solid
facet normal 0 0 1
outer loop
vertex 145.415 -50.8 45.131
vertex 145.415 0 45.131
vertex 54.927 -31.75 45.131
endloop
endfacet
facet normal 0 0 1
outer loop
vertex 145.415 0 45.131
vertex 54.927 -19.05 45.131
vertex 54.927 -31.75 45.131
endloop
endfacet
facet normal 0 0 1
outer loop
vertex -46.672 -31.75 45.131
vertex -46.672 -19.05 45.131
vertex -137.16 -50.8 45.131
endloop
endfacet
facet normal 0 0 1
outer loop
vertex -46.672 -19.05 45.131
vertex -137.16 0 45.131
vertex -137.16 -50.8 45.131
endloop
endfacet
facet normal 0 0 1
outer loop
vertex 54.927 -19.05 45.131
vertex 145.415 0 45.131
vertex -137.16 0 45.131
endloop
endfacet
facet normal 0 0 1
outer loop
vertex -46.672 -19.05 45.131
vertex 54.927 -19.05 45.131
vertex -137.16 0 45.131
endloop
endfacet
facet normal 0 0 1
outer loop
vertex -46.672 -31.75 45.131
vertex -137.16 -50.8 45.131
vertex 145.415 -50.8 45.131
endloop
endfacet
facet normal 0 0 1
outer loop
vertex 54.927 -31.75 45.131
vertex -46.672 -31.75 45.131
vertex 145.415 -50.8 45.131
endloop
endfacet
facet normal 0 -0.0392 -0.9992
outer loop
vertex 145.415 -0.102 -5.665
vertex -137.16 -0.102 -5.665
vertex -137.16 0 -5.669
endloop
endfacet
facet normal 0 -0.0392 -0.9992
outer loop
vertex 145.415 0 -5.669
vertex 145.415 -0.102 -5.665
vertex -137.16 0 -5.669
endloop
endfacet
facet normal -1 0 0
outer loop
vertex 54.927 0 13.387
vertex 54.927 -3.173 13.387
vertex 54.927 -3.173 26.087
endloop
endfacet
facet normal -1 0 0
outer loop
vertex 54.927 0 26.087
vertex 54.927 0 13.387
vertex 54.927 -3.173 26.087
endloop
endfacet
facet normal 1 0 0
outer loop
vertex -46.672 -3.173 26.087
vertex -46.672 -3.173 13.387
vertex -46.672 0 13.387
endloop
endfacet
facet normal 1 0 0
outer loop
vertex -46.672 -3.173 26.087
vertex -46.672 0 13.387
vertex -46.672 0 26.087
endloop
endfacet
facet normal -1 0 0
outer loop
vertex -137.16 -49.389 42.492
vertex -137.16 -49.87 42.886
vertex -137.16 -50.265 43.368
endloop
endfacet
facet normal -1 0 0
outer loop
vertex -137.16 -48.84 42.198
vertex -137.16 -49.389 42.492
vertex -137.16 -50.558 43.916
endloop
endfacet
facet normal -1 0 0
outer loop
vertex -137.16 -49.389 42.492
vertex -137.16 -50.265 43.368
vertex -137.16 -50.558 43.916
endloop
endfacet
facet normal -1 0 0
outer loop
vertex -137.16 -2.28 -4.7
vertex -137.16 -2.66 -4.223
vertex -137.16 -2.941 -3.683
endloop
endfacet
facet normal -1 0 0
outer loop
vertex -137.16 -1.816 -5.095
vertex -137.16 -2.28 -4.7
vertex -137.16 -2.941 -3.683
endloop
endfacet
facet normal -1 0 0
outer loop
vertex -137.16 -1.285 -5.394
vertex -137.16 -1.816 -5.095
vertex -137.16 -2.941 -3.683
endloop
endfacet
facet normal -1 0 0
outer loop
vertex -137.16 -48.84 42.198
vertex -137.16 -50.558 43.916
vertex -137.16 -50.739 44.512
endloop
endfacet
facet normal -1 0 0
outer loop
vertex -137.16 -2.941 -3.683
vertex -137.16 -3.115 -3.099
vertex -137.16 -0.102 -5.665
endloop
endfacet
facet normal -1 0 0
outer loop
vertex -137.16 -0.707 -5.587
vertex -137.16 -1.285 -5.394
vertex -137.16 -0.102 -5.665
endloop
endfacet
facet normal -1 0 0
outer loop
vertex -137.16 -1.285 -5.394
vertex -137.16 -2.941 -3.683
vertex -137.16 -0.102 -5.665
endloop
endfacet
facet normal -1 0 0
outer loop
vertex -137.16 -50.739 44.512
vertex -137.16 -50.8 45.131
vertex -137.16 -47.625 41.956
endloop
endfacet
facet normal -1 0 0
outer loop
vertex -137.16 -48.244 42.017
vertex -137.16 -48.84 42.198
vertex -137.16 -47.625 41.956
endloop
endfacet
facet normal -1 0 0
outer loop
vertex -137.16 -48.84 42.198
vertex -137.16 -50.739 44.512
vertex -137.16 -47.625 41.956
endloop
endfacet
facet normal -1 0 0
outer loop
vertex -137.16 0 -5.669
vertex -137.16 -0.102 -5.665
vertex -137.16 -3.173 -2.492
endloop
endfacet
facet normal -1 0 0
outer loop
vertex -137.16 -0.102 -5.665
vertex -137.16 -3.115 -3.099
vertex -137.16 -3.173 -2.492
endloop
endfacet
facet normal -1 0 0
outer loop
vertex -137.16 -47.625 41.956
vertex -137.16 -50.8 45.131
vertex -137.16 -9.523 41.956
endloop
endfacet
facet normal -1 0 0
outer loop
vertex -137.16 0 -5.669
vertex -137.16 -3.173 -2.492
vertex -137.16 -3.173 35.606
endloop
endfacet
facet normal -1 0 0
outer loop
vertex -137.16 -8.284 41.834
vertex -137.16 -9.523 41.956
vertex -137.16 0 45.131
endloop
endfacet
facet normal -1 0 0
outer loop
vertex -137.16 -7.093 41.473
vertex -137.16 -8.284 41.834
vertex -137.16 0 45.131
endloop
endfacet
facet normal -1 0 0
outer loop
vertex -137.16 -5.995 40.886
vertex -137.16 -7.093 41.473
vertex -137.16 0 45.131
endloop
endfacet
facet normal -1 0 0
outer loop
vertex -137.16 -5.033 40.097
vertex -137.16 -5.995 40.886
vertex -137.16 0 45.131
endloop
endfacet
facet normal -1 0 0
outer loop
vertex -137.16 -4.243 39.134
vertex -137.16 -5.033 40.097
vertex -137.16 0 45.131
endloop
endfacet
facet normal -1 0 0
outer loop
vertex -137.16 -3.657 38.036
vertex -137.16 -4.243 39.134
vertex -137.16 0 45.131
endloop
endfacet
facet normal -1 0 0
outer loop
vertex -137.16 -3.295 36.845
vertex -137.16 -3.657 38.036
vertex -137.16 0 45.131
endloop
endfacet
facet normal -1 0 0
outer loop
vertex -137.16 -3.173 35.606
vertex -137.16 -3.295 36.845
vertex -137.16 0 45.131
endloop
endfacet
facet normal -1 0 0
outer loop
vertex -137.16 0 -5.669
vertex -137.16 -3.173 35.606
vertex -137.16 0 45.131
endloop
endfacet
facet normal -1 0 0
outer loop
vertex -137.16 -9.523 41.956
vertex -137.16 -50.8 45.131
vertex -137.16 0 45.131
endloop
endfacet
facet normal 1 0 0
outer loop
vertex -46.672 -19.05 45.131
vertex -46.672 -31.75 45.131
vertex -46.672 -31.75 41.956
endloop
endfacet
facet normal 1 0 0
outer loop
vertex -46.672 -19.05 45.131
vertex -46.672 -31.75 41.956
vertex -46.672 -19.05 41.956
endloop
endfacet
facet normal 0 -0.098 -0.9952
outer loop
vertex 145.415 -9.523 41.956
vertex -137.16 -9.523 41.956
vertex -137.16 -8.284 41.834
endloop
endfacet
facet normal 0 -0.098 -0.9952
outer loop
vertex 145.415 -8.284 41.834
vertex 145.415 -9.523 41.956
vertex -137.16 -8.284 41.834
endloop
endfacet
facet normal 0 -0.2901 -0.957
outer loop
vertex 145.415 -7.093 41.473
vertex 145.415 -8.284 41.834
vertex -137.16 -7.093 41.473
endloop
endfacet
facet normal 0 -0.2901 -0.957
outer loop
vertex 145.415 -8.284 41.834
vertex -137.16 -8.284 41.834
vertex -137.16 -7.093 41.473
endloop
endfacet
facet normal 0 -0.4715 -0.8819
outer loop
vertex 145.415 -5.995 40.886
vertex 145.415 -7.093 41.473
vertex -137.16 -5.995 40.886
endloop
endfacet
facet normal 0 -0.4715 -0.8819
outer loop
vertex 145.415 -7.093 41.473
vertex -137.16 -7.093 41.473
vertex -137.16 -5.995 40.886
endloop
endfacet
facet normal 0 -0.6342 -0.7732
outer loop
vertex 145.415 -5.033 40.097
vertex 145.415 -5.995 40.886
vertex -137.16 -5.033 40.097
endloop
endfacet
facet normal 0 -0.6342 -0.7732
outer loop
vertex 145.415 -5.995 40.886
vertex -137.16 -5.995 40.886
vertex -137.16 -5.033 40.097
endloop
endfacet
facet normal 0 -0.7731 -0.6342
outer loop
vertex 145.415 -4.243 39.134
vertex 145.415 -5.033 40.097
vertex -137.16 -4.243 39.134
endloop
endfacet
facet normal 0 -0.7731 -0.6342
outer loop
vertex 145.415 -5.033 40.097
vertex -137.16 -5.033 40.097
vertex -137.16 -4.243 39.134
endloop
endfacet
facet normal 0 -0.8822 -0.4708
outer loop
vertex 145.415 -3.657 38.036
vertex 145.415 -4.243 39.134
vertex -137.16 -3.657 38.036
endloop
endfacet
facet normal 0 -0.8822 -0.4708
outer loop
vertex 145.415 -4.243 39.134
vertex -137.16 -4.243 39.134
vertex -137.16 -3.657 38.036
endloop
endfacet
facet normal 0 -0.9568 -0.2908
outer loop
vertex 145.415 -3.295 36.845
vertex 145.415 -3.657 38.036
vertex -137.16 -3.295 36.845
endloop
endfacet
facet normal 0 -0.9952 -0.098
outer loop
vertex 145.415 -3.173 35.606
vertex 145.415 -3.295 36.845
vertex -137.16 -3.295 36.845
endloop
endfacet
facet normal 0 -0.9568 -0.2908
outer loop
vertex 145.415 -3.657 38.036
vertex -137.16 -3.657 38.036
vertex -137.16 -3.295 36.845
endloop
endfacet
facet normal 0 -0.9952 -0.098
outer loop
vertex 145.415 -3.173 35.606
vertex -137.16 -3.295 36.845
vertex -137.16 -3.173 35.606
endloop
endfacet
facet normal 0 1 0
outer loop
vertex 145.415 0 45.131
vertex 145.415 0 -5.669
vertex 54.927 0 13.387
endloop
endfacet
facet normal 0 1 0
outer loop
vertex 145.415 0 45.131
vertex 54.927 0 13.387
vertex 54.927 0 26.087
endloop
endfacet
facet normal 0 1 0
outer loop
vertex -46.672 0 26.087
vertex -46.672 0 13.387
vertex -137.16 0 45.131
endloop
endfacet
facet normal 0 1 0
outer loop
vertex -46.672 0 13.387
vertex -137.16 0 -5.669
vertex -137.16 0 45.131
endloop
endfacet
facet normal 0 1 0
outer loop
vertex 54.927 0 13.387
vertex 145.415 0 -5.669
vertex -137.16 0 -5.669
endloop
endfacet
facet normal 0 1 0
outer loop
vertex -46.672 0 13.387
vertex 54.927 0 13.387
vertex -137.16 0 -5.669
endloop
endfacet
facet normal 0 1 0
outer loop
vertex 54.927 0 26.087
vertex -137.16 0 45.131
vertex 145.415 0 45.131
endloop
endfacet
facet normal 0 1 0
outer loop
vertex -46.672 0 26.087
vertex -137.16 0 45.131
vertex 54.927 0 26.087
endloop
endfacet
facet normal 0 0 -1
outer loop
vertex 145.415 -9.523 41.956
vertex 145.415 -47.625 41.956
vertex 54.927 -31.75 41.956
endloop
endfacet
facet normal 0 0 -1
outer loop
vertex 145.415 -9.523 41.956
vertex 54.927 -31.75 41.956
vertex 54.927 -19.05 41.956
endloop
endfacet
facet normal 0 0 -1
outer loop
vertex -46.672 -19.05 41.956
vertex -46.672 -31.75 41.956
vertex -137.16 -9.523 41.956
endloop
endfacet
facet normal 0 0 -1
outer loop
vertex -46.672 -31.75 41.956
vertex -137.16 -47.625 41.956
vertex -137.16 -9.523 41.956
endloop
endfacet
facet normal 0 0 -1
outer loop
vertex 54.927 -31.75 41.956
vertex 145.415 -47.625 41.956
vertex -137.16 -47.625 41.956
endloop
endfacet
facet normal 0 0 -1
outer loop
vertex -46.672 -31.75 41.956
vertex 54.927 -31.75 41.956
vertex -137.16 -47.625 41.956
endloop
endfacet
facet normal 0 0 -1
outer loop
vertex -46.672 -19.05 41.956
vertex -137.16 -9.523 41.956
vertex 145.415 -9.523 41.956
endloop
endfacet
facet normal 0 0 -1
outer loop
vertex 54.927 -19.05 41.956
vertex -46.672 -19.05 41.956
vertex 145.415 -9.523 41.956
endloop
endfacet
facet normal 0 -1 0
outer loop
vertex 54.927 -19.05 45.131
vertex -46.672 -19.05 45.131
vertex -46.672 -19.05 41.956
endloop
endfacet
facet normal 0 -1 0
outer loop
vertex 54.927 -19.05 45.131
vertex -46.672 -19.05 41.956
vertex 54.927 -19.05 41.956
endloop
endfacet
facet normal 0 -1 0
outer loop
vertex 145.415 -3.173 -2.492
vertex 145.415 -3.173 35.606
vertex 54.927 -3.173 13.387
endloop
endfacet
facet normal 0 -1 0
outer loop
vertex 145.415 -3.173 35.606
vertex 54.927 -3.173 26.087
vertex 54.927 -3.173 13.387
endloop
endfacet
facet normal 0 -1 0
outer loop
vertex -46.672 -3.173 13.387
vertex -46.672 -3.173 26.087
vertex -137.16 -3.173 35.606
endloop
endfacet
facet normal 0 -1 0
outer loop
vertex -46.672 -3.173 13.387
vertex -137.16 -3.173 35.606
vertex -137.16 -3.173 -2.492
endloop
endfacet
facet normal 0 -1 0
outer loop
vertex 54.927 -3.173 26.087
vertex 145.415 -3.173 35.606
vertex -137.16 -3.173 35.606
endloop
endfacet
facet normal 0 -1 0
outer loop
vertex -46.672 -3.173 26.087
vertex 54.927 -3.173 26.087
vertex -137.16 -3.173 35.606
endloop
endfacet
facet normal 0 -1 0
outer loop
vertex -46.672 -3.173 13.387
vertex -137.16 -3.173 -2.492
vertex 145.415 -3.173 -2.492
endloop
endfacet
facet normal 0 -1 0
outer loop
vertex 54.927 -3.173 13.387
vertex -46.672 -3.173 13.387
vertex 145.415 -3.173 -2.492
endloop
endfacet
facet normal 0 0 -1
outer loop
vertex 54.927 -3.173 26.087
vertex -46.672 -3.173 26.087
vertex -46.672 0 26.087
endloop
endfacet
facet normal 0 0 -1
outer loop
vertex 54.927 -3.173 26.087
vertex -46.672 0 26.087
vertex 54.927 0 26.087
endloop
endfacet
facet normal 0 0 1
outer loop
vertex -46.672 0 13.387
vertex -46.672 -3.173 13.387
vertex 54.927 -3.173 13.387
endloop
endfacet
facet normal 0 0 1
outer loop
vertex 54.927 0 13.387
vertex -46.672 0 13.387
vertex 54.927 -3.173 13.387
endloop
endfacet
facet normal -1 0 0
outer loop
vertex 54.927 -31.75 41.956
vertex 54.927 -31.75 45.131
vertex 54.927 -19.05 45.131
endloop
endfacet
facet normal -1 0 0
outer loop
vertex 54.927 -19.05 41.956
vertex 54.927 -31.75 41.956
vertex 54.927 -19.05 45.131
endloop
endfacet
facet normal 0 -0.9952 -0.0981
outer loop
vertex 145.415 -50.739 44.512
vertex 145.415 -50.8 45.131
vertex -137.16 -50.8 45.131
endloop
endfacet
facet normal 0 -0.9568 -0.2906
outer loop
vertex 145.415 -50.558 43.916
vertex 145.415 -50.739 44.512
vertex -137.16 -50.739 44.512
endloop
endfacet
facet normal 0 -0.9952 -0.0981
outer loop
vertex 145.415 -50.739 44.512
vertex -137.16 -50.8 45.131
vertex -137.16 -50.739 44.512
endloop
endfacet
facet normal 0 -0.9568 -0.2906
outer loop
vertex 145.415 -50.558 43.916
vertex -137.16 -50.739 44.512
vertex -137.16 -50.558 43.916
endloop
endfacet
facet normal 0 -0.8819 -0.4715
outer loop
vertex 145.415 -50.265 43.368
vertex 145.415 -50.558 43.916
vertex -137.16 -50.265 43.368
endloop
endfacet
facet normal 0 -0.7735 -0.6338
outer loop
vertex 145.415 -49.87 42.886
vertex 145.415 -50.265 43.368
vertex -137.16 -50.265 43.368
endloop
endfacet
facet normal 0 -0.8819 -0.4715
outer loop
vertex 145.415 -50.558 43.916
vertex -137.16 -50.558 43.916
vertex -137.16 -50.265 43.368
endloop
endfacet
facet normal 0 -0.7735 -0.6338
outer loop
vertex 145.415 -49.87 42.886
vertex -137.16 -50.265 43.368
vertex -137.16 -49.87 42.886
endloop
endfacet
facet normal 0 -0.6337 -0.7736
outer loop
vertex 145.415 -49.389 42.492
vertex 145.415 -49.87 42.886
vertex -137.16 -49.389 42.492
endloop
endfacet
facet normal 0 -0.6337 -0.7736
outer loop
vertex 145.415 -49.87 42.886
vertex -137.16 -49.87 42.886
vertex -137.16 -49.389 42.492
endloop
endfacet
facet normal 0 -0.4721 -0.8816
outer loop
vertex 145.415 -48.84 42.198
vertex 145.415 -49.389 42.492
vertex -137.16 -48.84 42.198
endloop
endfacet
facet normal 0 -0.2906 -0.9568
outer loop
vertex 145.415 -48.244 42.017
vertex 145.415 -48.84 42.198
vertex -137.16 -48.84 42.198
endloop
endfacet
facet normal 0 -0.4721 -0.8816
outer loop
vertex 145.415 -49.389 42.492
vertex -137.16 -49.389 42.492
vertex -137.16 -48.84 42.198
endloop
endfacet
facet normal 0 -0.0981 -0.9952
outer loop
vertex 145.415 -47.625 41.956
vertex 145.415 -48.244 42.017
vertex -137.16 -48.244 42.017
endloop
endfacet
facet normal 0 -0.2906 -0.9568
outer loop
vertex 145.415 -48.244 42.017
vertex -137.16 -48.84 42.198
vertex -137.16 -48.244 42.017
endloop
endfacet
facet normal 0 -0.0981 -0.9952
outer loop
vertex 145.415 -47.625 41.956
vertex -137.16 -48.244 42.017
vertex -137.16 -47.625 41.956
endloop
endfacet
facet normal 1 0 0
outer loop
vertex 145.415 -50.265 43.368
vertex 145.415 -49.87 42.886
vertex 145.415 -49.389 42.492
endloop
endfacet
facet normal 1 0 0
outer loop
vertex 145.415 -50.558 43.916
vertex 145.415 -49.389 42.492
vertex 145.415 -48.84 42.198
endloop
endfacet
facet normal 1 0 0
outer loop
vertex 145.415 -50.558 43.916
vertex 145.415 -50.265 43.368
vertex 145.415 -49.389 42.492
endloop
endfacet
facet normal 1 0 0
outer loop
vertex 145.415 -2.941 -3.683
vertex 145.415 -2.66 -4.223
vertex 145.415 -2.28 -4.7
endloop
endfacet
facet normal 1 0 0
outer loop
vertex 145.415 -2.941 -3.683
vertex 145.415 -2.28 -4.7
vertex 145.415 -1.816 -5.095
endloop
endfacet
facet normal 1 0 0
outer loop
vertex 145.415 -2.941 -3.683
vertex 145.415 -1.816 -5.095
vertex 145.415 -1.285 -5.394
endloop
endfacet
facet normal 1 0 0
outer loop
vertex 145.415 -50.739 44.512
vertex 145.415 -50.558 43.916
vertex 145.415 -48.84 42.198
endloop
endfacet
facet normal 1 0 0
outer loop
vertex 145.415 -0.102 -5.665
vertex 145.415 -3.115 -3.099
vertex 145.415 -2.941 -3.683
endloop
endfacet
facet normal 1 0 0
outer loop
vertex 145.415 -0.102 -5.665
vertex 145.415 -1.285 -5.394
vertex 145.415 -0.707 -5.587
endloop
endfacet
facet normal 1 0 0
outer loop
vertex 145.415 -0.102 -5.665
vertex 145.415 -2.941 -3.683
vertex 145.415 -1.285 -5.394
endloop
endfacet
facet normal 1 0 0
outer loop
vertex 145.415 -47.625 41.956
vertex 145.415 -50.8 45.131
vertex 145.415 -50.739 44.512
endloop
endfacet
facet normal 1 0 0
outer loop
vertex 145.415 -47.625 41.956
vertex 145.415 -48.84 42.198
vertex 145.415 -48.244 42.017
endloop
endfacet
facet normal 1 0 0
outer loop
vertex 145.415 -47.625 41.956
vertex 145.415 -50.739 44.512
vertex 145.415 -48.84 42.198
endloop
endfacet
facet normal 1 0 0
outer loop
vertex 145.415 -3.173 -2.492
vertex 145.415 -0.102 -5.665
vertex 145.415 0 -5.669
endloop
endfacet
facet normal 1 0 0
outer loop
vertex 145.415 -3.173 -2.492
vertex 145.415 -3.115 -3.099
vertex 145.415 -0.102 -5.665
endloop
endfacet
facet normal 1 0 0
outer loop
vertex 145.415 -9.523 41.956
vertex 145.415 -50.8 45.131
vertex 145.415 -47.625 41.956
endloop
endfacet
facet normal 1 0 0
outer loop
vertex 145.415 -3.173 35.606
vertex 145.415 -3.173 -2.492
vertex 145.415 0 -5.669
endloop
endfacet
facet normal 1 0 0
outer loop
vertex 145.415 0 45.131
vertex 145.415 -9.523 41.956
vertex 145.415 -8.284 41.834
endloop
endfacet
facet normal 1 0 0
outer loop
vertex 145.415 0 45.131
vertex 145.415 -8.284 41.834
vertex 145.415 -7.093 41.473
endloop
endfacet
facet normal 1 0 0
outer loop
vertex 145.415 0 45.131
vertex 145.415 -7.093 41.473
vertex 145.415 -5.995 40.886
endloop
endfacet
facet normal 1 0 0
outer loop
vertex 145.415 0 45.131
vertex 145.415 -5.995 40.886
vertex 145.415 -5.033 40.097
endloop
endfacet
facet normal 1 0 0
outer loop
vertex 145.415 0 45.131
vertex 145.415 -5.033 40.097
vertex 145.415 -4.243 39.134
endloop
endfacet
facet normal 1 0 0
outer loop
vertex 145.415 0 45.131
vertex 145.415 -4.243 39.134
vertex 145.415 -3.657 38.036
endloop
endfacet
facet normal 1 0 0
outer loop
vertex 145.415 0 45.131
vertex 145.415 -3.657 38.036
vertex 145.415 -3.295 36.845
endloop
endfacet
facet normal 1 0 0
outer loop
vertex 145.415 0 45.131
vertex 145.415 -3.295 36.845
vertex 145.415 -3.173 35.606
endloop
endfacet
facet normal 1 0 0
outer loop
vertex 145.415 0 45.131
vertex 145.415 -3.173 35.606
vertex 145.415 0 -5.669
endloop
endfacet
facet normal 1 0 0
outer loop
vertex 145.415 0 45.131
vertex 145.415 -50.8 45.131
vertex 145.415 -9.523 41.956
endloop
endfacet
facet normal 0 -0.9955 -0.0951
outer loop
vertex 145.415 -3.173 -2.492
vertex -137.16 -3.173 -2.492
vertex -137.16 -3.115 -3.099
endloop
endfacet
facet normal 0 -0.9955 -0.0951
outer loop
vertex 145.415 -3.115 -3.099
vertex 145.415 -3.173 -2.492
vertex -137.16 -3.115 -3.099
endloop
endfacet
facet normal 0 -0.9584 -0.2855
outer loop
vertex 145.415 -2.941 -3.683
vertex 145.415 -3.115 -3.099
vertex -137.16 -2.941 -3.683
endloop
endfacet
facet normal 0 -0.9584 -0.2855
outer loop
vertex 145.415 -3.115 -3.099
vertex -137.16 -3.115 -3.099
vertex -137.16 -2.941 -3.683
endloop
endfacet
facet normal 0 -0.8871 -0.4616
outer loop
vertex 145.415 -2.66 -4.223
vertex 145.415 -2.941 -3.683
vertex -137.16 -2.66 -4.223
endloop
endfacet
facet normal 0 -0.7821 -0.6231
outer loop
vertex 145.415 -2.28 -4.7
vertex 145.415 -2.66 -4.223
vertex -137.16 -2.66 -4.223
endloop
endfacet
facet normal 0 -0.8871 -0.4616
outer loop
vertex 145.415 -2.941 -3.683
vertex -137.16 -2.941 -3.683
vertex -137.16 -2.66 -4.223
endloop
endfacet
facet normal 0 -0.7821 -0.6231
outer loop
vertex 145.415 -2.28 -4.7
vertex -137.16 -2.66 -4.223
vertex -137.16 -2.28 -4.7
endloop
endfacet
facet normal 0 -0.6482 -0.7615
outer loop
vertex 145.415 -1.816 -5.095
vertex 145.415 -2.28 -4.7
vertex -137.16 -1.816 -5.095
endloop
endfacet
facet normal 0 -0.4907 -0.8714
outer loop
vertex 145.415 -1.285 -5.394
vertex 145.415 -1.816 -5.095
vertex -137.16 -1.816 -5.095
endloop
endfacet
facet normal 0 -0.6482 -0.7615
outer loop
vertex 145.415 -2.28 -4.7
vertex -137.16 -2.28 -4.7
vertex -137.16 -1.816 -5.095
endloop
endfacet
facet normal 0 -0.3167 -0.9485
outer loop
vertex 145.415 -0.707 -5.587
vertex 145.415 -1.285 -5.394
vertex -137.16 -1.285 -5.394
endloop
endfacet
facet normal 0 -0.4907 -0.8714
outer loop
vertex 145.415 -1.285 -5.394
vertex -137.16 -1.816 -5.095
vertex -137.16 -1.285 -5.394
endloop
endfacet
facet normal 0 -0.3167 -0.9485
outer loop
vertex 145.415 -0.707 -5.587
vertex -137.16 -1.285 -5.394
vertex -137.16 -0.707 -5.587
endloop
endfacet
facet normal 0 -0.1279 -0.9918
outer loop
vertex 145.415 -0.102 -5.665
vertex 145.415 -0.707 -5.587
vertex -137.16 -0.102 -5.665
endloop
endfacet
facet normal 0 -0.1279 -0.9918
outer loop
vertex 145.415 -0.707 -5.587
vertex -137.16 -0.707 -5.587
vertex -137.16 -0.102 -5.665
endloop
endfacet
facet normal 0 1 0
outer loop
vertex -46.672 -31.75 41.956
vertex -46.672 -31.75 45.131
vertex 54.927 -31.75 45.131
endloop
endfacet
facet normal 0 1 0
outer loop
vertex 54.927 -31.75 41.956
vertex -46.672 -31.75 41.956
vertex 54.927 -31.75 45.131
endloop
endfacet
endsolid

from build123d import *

# Parameters (mm, degrees)
F1_DEPTH      = 282.575
F4_W          = 101.6
F4_H          = 12.7
F5_DEPTH      = 25.4
F5_DEPTH_BACK = 25.4
F3_W          = 101.6
F3_H          = 12.7
F6_DEPTH      = 25.4
F6_DEPTH_BACK = 25.4


with BuildPart() as f1:
    # F0 (on Right) → F1 (new body)
    with BuildSketch(Plane.YZ):
        with BuildLine():
            Line((-0.102489, -7.189187), (0, -7.192553))
            Line((0, -7.192553), (0, 43.607447))
            Line((0, 43.607447), (-50.8, 43.607447))
            ThreePointArc((-50.8, 43.607447), (-49.870064, 41.362383), (-47.625, 40.432447))
            Line((-47.625, 40.432447), (-9.52329, 40.432447))
            ThreePointArc((-9.52329, 40.432447), (-5.033162, 38.572575), (-3.17329, 34.082447))
            Line((-3.17329, 34.082447), (-3.17329, -4.015898))
            ThreePointArc((-3.17329, -4.015898), (-2.279896, -6.223814), (-0.102489, -7.189187))
        make_face()
    extrude(amount=F1_DEPTH)


with BuildPart() as f1_1:
    # F2: moved
    add(f1.part.moved(Location((-137.16, 0, 1.524))))

    # F4 (on face) → F5 (cut, two sides)
    with BuildSketch(Plane.XZ.offset(3.17329)) as f5_sk:
        with Locations((4.1275, 19.737222)):
            Rectangle(F4_W, F4_H)
    extrude(amount=-F5_DEPTH, mode=Mode.SUBTRACT)
    extrude(f5_sk.sketch, amount=-F5_DEPTH_BACK, mode=Mode.SUBTRACT)

    # F3 (on face) → F6 (cut, two sides)
    with BuildSketch(Plane.XY.offset(45.131447)) as f6_sk:
        with Locations((4.1275, -25.4)):
            Rectangle(F3_W, F3_H)
    extrude(amount=-F6_DEPTH, mode=Mode.SUBTRACT)
    extrude(f6_sk.sketch, amount=-F6_DEPTH_BACK, mode=Mode.SUBTRACT)


solid = f1_1.part
